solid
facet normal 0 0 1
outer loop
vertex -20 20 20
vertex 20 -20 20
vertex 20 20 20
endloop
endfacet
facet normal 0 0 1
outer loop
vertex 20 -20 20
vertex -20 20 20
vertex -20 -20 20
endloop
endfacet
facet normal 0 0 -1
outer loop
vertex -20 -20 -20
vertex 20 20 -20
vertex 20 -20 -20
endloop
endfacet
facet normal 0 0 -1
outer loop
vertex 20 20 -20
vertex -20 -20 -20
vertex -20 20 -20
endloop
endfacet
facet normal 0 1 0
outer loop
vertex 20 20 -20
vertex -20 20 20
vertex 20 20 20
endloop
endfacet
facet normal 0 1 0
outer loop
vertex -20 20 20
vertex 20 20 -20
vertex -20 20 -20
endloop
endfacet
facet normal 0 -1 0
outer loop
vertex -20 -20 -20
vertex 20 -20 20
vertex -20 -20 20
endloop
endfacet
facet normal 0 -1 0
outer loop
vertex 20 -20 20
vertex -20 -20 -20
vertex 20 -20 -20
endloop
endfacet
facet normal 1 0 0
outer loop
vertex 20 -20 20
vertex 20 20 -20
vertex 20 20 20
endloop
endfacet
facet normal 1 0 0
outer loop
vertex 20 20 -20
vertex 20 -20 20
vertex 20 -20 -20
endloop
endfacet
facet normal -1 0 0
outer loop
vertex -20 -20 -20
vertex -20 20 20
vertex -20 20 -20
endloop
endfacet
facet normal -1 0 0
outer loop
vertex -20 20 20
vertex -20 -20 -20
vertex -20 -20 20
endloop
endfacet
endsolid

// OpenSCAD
// Cube
// (C) @oblomobka - 2023.05
// GPL license

/* **CUSTOMIZER VARIABLES** */
// Edge
edge = 40; //[10:100]
// Center of the solid or stand over a face
position = "Center"; //["Center", "Face"]

/* **MODULES** */
module Cube ( edge = 30, position = "Face"){
    
    // Invariants
    diAngleCube = 90; // dihedral angle of cube
    
    // Relations
    rCirCube = sqrt(3)/2; // radius of a circumscribed sphere for edge = 1 / = 1,061...
    rInsCube = 1/2; // radius of a inscribed sphere for edge = 1 / = 0,5
    rMidCube = 1/sqrt(2); // Midradius, which touches the middle of each edge / =0,707...
    
    // Variables
    a = edge/2;
    
    // Definition of points and faces V = 8 / F = 6
    Cpoints = [
        [ +a, +a, +a], [ -a, +a, +a], [ +a, -a, +a], [ -a, -a, +a],     // UP       [  0,  1,  2,  3]
        [ +a, +a, -a], [ -a, +a, -a], [ +a, -a, -a], [ -a, -a, -a],     // DOWN     [  4,  5,  6,  7]
        ];
    
    Cfaces = [
        [ 0, 2, 3, 1], [ 4, 5, 7, 6],       // XY
        [ 0, 1, 5, 4], [ 2, 6, 7, 3],       // XZ
        [ 0, 4, 6, 2], [ 1, 3, 7, 5]        // YZ
        ];
    
    // Polyhedron stands on xy plane centered on the center of the face or centered on the center of polyhedron
    if ( position == "Face"){
        translate([ 0, 0, a])
            polyhedron( Cpoints, Cfaces);}
    else if ( position == "Center") {
        polyhedron( Cpoints, Cfaces);} 
}


/* **RENDERING OF SOLIDS** */ 
Cube ( edge = edge, position = position);
